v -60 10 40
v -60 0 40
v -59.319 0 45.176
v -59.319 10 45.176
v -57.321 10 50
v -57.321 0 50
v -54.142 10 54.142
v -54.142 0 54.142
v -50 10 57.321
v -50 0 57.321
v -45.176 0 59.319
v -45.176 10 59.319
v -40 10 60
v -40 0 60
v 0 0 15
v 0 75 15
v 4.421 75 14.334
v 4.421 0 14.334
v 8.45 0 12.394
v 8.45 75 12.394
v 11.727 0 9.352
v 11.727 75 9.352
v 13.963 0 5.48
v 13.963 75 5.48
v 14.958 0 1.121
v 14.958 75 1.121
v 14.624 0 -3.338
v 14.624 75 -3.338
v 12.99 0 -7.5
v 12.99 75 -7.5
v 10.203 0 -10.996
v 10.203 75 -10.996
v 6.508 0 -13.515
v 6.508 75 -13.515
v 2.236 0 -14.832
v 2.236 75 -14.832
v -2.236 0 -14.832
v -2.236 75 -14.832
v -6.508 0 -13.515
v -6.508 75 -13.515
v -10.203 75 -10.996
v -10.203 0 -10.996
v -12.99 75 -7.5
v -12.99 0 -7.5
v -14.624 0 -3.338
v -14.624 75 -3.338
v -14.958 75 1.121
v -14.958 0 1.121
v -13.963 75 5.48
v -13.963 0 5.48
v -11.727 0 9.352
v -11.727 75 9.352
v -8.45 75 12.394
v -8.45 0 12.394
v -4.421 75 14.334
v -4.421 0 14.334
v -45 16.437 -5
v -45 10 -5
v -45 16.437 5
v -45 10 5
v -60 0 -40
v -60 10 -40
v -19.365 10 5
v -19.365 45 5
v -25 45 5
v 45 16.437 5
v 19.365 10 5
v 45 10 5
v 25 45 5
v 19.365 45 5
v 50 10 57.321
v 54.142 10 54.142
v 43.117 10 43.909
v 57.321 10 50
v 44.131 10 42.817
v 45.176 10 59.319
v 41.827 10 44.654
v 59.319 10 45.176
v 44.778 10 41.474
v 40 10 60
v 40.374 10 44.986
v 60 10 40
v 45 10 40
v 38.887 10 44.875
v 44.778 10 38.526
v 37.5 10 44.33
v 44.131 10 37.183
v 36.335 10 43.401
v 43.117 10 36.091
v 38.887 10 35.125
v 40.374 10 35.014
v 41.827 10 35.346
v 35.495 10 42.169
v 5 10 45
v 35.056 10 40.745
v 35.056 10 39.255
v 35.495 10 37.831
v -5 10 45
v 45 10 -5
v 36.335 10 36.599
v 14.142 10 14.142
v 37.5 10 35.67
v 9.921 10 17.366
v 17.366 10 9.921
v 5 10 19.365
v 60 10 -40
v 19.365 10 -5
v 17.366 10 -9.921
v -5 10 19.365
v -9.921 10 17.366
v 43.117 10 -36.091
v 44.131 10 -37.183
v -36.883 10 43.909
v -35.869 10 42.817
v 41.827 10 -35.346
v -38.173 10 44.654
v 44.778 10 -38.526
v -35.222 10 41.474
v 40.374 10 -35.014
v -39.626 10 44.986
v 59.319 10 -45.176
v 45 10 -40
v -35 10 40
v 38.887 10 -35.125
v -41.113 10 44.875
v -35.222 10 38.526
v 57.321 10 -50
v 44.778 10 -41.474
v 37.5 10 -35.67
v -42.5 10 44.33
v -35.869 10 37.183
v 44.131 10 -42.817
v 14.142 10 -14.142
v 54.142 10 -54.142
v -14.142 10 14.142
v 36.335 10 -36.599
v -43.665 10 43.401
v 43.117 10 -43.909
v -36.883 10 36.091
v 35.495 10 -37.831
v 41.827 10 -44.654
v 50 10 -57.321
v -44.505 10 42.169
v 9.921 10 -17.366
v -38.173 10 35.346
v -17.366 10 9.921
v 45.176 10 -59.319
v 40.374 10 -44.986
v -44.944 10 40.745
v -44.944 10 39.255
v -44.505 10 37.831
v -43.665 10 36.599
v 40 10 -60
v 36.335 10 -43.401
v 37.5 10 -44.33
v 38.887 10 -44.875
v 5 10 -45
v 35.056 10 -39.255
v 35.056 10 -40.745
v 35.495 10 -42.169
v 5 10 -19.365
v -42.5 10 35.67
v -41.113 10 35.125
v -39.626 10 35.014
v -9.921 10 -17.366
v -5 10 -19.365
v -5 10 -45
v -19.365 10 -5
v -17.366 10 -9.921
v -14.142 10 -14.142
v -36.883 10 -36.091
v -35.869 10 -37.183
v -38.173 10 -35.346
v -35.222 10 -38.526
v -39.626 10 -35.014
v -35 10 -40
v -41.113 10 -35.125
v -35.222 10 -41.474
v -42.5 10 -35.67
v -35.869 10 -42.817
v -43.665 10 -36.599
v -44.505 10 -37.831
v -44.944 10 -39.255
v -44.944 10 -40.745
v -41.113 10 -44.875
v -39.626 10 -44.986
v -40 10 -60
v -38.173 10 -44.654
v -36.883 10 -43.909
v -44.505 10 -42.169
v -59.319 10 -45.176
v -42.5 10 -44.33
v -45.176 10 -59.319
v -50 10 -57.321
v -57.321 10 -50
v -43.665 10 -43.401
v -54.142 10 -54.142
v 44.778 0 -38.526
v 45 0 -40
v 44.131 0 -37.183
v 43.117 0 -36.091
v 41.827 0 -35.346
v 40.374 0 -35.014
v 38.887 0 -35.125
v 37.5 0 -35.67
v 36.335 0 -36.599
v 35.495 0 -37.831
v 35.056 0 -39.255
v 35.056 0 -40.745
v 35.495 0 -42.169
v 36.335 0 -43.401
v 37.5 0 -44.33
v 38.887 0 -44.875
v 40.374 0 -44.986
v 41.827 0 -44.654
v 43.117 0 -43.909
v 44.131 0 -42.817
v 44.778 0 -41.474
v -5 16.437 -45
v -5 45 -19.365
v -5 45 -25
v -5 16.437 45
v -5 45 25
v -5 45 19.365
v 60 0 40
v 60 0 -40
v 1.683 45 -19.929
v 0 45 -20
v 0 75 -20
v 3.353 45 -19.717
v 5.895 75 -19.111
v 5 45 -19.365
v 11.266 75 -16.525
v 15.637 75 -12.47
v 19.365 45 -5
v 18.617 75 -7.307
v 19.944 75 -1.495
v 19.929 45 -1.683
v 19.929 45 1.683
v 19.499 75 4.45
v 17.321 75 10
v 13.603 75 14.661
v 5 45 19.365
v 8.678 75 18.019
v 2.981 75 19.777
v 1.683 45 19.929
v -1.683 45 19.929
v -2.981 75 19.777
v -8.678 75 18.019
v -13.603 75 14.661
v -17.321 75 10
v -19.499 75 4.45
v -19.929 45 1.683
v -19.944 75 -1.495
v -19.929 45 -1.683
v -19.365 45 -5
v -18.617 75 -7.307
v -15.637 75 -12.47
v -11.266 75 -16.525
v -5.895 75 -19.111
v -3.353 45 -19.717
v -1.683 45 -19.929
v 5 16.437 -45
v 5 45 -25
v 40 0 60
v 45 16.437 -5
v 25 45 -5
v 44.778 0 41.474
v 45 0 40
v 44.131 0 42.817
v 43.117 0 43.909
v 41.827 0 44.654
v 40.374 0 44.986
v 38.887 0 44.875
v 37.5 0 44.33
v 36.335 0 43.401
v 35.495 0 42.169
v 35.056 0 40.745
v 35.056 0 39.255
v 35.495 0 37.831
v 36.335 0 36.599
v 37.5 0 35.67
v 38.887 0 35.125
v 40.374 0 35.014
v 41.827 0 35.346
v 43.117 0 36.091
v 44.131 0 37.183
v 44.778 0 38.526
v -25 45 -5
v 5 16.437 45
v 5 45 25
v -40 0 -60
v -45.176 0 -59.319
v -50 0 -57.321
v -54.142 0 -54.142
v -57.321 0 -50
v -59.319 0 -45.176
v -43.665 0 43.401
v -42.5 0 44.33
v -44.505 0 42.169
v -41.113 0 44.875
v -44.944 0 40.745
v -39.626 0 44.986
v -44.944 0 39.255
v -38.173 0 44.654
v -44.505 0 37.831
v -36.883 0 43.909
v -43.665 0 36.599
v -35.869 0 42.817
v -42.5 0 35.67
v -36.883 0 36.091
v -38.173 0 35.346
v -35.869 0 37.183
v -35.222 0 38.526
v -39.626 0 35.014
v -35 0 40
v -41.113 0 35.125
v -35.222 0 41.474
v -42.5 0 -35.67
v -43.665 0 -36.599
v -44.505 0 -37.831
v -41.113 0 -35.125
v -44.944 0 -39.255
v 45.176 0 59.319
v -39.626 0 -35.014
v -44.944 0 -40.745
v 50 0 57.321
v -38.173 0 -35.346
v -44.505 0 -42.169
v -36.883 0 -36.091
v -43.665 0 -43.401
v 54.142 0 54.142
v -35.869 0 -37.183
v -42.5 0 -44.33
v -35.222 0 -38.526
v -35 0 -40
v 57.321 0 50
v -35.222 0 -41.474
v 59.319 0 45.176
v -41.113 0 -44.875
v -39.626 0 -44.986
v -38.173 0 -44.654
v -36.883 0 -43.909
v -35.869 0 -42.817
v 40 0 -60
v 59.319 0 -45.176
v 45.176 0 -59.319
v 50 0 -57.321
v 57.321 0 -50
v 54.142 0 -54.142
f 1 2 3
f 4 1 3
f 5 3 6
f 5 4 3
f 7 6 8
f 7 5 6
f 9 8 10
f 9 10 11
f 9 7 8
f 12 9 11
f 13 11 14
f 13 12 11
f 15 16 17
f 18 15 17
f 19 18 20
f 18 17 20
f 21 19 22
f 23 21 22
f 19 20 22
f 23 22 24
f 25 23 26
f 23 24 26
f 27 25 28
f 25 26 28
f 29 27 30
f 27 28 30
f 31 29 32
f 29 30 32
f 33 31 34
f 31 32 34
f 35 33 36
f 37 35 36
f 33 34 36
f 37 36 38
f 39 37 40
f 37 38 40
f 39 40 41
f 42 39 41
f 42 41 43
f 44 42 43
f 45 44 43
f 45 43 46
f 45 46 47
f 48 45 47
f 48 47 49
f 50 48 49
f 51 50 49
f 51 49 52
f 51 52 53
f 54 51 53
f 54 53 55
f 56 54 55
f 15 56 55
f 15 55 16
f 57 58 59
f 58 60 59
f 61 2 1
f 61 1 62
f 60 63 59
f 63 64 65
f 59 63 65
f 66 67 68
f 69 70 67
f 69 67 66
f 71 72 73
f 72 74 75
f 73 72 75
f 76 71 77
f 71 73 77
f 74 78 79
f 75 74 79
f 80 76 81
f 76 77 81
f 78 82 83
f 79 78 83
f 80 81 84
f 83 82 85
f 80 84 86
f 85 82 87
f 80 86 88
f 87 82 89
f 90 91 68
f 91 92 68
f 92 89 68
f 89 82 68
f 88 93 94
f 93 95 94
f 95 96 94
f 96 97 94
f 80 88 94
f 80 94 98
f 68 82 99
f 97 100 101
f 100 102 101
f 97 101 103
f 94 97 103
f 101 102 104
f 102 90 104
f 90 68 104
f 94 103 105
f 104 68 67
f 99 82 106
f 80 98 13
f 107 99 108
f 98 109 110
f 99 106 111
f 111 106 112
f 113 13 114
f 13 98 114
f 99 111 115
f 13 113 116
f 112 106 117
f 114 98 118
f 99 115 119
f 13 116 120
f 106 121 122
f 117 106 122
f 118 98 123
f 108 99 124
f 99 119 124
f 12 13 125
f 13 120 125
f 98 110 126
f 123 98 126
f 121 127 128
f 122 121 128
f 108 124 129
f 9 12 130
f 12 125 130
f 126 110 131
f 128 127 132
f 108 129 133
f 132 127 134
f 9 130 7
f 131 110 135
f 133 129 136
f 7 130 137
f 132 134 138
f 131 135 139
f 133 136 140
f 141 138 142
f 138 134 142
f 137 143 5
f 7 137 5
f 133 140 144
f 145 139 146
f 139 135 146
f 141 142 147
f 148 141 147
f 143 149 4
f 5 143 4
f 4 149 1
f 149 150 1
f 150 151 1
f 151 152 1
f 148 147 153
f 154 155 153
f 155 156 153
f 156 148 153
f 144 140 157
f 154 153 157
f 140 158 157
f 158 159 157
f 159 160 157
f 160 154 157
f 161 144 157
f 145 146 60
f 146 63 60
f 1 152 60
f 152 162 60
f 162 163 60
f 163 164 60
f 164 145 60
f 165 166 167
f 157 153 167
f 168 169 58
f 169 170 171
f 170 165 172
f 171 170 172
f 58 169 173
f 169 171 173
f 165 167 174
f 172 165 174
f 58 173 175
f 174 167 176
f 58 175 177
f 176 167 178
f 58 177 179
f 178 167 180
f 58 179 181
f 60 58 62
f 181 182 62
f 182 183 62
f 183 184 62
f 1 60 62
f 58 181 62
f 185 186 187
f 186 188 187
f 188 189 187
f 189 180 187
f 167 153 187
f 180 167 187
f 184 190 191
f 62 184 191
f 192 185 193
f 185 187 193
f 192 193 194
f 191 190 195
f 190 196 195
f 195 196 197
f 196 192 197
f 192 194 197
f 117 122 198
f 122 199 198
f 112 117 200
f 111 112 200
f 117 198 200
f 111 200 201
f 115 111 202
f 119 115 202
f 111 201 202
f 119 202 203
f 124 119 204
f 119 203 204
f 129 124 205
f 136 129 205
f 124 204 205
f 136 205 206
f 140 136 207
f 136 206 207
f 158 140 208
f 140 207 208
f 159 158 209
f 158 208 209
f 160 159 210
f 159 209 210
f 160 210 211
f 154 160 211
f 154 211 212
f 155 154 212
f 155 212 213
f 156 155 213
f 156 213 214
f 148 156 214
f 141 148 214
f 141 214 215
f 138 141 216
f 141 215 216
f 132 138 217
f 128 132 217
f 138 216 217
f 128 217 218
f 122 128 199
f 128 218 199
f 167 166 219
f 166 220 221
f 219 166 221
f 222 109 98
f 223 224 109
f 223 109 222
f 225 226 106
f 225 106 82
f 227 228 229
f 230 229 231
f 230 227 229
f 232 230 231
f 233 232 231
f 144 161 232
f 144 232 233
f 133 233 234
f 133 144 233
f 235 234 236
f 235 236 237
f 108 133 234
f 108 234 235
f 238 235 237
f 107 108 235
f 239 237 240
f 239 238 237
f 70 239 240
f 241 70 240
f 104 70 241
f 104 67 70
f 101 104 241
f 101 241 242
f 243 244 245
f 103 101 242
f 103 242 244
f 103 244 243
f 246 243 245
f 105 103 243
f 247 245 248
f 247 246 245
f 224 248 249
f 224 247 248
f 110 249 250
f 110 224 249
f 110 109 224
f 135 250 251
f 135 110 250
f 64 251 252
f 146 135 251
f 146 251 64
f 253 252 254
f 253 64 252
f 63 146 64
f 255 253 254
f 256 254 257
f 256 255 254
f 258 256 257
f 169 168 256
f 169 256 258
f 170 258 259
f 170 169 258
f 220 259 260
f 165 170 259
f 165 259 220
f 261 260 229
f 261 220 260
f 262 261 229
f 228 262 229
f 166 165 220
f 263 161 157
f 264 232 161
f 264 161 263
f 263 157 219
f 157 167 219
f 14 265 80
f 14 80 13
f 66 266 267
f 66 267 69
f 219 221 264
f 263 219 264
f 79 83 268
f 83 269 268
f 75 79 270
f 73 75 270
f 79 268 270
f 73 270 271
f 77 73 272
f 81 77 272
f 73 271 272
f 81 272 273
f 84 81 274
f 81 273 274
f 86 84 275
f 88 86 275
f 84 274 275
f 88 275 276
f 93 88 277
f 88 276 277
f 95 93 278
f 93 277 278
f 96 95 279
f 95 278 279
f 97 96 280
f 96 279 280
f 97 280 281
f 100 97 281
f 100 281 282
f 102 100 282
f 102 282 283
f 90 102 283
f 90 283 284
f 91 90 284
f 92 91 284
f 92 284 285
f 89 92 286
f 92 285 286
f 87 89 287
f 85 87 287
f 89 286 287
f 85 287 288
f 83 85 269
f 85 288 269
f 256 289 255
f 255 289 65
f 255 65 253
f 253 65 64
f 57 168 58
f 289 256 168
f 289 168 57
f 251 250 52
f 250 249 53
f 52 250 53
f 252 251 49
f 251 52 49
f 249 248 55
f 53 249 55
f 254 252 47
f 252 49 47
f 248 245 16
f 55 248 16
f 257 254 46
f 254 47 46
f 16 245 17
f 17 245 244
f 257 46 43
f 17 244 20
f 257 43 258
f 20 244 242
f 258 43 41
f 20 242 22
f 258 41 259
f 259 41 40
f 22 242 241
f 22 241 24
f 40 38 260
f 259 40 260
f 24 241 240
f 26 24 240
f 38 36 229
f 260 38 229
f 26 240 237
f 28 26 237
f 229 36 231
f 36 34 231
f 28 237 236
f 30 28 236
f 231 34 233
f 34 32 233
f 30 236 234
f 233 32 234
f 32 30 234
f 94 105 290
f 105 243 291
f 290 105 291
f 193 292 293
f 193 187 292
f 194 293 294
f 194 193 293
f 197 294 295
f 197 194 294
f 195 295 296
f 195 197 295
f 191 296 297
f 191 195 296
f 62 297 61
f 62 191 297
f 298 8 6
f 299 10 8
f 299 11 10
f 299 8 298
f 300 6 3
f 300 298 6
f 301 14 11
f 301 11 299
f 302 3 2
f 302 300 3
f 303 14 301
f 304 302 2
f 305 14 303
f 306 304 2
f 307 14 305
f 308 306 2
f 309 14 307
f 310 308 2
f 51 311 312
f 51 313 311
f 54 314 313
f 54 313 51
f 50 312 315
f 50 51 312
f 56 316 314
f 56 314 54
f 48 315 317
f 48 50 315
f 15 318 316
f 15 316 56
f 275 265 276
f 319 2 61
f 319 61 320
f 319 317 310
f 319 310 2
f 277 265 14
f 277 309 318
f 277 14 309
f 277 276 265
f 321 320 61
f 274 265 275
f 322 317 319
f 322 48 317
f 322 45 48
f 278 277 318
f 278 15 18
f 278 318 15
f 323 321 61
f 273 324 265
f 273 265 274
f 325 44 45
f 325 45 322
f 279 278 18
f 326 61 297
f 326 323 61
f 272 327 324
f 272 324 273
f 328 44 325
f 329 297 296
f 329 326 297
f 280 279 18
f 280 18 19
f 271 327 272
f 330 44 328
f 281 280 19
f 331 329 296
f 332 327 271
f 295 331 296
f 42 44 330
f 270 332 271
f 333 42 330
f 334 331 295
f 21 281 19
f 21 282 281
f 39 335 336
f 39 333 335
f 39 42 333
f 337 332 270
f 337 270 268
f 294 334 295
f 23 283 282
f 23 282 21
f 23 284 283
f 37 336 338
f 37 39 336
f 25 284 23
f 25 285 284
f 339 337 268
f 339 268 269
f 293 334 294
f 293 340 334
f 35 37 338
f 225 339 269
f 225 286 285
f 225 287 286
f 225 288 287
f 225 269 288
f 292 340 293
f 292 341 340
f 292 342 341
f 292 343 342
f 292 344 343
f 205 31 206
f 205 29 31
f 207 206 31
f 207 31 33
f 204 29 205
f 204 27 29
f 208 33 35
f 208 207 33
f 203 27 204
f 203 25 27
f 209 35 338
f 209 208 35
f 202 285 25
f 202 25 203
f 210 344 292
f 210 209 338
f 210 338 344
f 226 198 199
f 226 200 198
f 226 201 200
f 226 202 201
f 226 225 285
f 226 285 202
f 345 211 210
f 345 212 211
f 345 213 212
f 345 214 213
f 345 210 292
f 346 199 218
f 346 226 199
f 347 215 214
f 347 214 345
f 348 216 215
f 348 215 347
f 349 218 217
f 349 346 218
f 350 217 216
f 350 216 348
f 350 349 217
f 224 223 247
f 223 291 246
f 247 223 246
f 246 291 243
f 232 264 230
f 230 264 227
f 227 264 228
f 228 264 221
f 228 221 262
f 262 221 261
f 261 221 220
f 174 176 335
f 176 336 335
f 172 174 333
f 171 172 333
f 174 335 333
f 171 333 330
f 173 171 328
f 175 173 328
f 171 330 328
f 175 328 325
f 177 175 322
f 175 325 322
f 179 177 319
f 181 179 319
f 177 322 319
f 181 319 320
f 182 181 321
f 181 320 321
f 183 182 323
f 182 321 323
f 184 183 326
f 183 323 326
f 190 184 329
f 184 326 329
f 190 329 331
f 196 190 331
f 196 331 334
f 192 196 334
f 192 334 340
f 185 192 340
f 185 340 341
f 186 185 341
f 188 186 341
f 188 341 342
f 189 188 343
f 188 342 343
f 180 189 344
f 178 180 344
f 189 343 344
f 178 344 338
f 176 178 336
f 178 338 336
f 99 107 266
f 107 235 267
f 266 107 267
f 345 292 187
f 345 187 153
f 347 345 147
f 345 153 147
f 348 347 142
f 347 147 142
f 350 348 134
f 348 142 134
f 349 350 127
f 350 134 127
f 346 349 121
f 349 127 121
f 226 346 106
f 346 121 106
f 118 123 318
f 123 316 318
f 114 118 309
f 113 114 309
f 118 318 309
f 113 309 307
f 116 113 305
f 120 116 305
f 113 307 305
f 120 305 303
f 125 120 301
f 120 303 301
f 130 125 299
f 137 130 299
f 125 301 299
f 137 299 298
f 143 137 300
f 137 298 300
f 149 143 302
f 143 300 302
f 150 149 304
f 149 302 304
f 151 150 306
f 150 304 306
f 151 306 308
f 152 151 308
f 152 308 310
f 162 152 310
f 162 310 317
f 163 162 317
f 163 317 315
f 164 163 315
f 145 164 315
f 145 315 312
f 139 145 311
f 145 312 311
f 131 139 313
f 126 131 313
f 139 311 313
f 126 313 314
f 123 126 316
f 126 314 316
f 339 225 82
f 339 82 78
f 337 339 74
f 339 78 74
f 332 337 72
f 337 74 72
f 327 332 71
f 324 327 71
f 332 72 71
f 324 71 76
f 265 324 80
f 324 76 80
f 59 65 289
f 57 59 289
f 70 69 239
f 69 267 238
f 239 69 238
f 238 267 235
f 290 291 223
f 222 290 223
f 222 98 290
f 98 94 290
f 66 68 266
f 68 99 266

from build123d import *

# Parameters (mm, degrees)
BOSS_EXTRUDE1_DEPTH            = 10
SKETCH2_R                      = 20
BOSS_EXTRUDE2_DEPTH            = 75
BOSS_EXTRUDE3_DEPTH            = 5
CHAMFER1_SIZE                  = 20
CHAMFER1_SIZE2                 = 28.562960134842417
CIRPATTERN1_COUNT              = 4
CHAMFER1_OF_CIRPATTERN1_SIZE2  = 28.562960134842417
CHAMFER1_OF_CIRPATTERN1_SIZE   = 20
SKETCH4_R                      = 15
CUT_EXTRUDE1_DEPTH             = 114.24751652906124
FILLET1_R                      = 20
F_10_0_10_DIAMETER_HOLE1_D     = 10
F_10_0_10_DIAMETER_HOLE1_DEPTH = 10
F_10_0_10_DIAMETER_HOLE1_TIP   = 3.0043030951378014


with BuildPart() as part:
    # Sketch1 → Boss-Extrude1 (new body)
    with BuildSketch(Plane(origin=(0, 0, 0), x_dir=(1, 0, 0), z_dir=(0, 1, 0))):
        Polygon((-60.00000000000001, 59.99999999999999), (59.99999999999999, 59.99999999999999), (60.00000000000001, -60.00000000000001), (-59.99999999999999, -60.00000000000001), align=None)
    extrude(amount=BOSS_EXTRUDE1_DEPTH)

    # Sketch2 → Boss-Extrude2 (add)
    with BuildSketch(Plane.XZ):
        with Locations(Location((0, 0, 0), (0, 0, 270))):
            Circle(SKETCH2_R)
    extrude(amount=-BOSS_EXTRUDE2_DEPTH)

    # Sketch3 → Boss-Extrude3 (add, symmetric)
    with BuildSketch(Plane.XY):
        Polygon((0, 10), (-45, 9.999999999999995), (-45, 45), (0, 45), align=None)
    boss_extrude3 = extrude(amount=BOSS_EXTRUDE3_DEPTH, both=True)

    # Chamfer1
    chamfer1_edges = [part.edges().sort_by_distance(p)[0] for p in [
        (-45, 45, 0),
    ]]
    chamfer1_side = [part.faces().sort_by_distance(p)[0] for p in [
        (-32.39412654979103, 45, 2.29e-15),
    ]]
    chamfer(chamfer1_edges, length=CHAMFER1_SIZE, length2=CHAMFER1_SIZE2, reference=chamfer1_side[0])

    # CirPattern1: Boss-Extrude3 ×4 about axis
    cirpattern1_axis = Axis((-1.07e-15, 0, 7e-17), (0, 1, 0))
    for i in range(1, CIRPATTERN1_COUNT):
        add(boss_extrude3.rotate(cirpattern1_axis, i * 360 / CIRPATTERN1_COUNT))

    # Chamfer1 of CirPattern1
    chamfer1_of_cirpattern1_edges = [part.edges().sort_by_distance(p)[0] for p in [
        (-3.9e-15, 45, 45),
        (45, 45, 5.66e-15),
        (7.27e-15, 45, -45),
    ]]
    chamfer(chamfer1_of_cirpattern1_edges, length=CHAMFER1_OF_CIRPATTERN1_SIZE, length2=CHAMFER1_OF_CIRPATTERN1_SIZE2)

    # Sketch4 → Cut-Extrude1 (cut, through all)
    with BuildSketch(Plane(origin=(0, 75, 0), x_dir=(1, 0, 0), z_dir=(0, 1, 0))):
        with Locations(Location((0, 0, 0), (0, 0, 270))):
            Circle(SKETCH4_R)
    extrude(amount=-CUT_EXTRUDE1_DEPTH, mode=Mode.SUBTRACT)

    # Fillet1
    fillet1_edges = [part.edges().sort_by_distance(p)[0] for p in [
        (60.00000000000001, 5, 60.00000000000001),
        (-59.99999999999999, 5, 60.00000000000001),
        (-60.00000000000001, 5, -59.99999999999999),
        (59.99999999999999, 5, -59.99999999999999),
    ]]
    fillet(fillet1_edges, radius=FILLET1_R)

    # Ø10.0 (10) Diameter Hole1
    with Locations(Plane(origin=(0, 10, 0), x_dir=(-1, 0, 0), z_dir=(0, 1, 0))):
        with Locations((40, -40), (40, 40), (-40, 40), (-40, -40)):
            Hole(F_10_0_10_DIAMETER_HOLE1_D / 2, depth=F_10_0_10_DIAMETER_HOLE1_DEPTH)
            with Locations((0, 0, -(F_10_0_10_DIAMETER_HOLE1_DEPTH + F_10_0_10_DIAMETER_HOLE1_TIP / 2))):  # 118° drill point
                Cone(0, F_10_0_10_DIAMETER_HOLE1_D / 2, F_10_0_10_DIAMETER_HOLE1_TIP, mode=Mode.SUBTRACT)


solid = part.part
